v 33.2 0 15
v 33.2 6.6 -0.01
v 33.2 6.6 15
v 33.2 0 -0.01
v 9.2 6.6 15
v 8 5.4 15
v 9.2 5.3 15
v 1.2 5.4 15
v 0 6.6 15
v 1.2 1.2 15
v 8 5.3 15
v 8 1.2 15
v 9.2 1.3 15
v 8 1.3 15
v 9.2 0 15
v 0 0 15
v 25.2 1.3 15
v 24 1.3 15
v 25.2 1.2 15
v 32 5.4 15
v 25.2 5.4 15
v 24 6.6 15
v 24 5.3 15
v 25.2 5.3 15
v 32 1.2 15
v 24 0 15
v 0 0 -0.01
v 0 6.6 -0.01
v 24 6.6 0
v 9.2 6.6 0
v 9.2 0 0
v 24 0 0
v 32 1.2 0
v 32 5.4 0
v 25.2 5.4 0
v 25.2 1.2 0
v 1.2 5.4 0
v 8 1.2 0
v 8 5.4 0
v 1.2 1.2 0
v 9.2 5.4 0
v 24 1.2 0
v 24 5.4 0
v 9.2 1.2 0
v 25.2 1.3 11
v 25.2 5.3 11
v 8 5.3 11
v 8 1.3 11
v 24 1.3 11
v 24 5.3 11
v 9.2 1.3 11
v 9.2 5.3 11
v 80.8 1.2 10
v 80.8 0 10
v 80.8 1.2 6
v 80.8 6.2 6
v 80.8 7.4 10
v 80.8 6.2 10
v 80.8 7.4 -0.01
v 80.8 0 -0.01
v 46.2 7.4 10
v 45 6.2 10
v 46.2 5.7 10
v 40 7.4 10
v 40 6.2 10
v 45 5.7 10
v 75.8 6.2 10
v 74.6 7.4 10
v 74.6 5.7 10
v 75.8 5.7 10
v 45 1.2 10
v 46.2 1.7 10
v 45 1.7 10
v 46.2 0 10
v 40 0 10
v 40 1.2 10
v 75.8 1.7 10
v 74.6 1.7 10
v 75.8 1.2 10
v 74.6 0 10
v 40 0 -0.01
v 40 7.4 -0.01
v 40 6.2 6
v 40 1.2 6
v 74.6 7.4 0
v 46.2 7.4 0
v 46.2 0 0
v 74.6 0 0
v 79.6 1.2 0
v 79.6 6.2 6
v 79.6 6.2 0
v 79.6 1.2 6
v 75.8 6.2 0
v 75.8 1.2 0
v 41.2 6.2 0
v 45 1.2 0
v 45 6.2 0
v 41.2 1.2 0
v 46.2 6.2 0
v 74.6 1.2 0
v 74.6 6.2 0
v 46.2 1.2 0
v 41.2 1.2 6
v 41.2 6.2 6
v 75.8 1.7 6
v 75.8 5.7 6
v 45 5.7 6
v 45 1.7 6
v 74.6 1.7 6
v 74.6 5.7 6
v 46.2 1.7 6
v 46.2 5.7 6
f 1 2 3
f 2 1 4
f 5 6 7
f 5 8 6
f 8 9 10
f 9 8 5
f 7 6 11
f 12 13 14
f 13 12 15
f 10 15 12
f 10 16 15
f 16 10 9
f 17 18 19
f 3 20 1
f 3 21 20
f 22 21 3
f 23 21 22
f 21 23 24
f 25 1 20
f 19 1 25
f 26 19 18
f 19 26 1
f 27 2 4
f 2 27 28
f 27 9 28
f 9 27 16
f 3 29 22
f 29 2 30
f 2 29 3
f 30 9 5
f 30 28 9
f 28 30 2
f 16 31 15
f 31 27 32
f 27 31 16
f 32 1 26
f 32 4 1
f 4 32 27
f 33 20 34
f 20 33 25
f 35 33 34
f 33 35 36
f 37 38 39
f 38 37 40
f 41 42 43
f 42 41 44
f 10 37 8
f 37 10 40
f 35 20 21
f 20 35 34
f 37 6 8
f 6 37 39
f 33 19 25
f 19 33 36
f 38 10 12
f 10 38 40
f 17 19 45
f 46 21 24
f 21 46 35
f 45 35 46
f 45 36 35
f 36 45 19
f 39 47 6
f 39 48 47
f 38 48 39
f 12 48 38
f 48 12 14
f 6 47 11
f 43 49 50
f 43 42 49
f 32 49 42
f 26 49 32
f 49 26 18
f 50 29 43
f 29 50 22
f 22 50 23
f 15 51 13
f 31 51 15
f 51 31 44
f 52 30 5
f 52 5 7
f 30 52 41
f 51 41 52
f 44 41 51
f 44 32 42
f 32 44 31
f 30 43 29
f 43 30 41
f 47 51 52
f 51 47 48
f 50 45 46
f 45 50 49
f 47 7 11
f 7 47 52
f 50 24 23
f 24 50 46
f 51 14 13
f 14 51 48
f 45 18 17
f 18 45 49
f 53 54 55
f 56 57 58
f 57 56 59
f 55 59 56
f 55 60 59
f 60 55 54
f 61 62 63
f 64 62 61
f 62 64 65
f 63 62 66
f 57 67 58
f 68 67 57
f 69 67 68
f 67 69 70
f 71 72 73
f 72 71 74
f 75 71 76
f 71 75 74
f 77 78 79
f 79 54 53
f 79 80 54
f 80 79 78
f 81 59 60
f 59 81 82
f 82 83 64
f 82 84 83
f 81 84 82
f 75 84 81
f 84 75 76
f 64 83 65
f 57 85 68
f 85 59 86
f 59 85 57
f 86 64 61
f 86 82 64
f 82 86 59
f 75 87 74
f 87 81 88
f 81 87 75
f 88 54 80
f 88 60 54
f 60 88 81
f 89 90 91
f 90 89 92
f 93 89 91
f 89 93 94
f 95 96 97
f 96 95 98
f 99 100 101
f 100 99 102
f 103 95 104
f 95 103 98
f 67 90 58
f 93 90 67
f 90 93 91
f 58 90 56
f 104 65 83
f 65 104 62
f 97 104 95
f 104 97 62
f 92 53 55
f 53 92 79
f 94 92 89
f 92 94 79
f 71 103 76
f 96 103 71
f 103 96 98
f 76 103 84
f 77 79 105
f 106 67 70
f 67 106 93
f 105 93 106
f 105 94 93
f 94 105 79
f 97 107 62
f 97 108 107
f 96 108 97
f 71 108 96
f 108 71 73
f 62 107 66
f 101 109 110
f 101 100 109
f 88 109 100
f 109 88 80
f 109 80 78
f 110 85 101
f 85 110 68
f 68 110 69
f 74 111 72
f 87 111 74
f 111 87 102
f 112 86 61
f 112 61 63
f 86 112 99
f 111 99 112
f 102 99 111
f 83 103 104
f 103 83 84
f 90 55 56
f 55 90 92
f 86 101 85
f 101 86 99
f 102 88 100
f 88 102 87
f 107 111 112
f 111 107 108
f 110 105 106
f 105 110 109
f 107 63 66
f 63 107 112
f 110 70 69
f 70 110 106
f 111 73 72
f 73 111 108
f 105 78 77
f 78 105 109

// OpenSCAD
// file: ../../Base/Boxes.scad
// Fischertechnik Box Foundation
// Pre-designed Boxes

use <Constants.scad>

include <PlacementOptions.scad>

box190Width = 190;
box190Depth = 130;
box130Width = 130;
box130Depth = 95;
boxUsageHeight = 33.9;
boxWallThickness = 2.4;
boxBaseThickness = 1.0;

// getBoxWallThickness()
// Gets the wall thickness of a Fischertechnik Box

function getBoxWallThickness() = boxWallThickness;

// Gets the usable height of a fischertechnik box
function getBoxUsageHeight() = boxUsageHeight;

// Gets the thickness of the Fischertechnik box base.
function getBoxBaseThickness() = boxBaseThickness;

// Gets the usable inner space of a Box 190 as an x/y-list
function getBox190Space() = [
    box190Width - 2*getBoxWallThickness(), 
    box190Depth - 2*getBoxWallThickness() ];

// Imports the Fischertechnik empty box 130x190 mm and places it at position 0,0
// 190x130 are the outer sizes, the inner space is slightly smaller. Use getBox190Space() to get the inner sizes.
// This module needs the STL file "Fischertechnik Box 130x190.stl" in the library path.
// The box is positioned that the usable inner space is at the 0,0,0 position. The

module Box190() {
    translate([-getBoxWallThickness(),-getBoxWallThickness(),-getBoxBaseThickness()])
        import("Fischertechnik Box 130x190.stl", convexity=3);
}

// Gets the usable inner space of a Box 130 as an x/y-list
function getBox130Space() = [
    box130Width - 2*getBoxWallThickness(), 
    box130Depth - 2*getBoxWallThickness() ];

// Imports the Fischertechnik empty box 95x130 mm and places it at position 0,0
// 190x130 are the outer sizes, the inner space is slightly smaller. Use getBox190Space() to get the inner sizes.
// This module needs the STL file "Fischertechnik Box 95x130.stl" in the library path.
// The box is positioned that the usable inner space is at the 0,0,0 position. The

module Box130() {
    translate([-getBoxWallThickness(),-getBoxWallThickness(),-getBoxBaseThickness()])
        import("Fischertechnik Box 95x130.stl", convexity=3);
}

// Creates a web at the specified box walls
// corner 0 = LowerLeft, 1 = UpperLeft, 2 = UpperRight, 3 = LowerRight
// side 0 = LeftOfCorner, 1 = RightOfCorner
// distance = Distance in mm from the corner
// box = inner width and depth of the box (default: Box 190)
// webWidth = length of the web (default is 3 mms)
// webThickness = thickness of the web (default is 1 mm)

module BoxWeb(corner, side, distance, box=getBox190Space(), webWidth=3, webThickness=1.0) {
    sink = getBoxWallThickness()/2;

    width = (corner % 2 == 0) ? 
            (side == LeftOfCorner ? webWidth : webThickness) :
            (side == LeftOfCorner ? webThickness : webWidth);

    depth = (corner % 2 == 0) ? 
            (side == RightOfCorner ? webWidth : webThickness) :
            (side == RightOfCorner ? webThickness : webWidth);
    
    xDiff = corner == LowerLeft ? 
                (side == LeftOfCorner ? -sink : distance) :
            (corner == UpperLeft ?                
                (side == LeftOfCorner ? distance : -sink) :
            (corner == UpperRight ?
                (side == LeftOfCorner ? box.x-webWidth+sink : box.x-distance-webThickness) :
                (side == LeftOfCorner ? box.x-distance-webThickness: box.x-webWidth+sink)));

    yDiff = corner == LowerLeft ? 
                (side == RightOfCorner ? -sink : distance) :
            (corner == UpperLeft ?
                (side == RightOfCorner ? box.y-distance : box.y-webWidth+sink) :
            (corner == UpperRight ?
                (side == RightOfCorner ? box.y-webWidth+sink : box.y-distance) :
                (side == RightOfCorner ? distance : -sink)));
    
    translate([xDiff, yDiff, -getExcess()])
        cube([width, depth, boxUsageHeight + 2*getExcess()]);
}
// file: ../../Base/Rotation.scad
// Fischertechnik Box Foundation
// Geometry Helpers Rotation

include <PlacementOptions.scad>

// getRotatedSpace(space, rotation=NoRotation)
// Rotates the space dependent on the specified rotation

function getRotatedSpace(space, rotation=NoRotation) = [
    (rotation == Rotate90 || rotation == Rotate270) ? space.y : space.x,
    (rotation == Rotate90 || rotation == Rotate270) ? space.x : space.y
];

// Rotates the given space around the fixed left lower corner
// space = the space the children needs as width/depth list [width,depth]
// rotation = 0 Rotate0 degrees, 1 Rotate90 degrees, 2 Rotate180 degrees, 3 Rotate270 degrees (equivalent to -90)

module RotateFix(space, rotation=Rotate0) {
    dy = (rotation == Rotate0 || rotation == Rotate270) ? 0 :
        (rotation == Rotate90) ? space.x :
        space.y;
    dx = (rotation < Rotate180) ? 0 :
        (rotation == Rotate180) ? space.x :
        space.y;
    
    translate([dx, dy, 0])
        rotate([0, 0, rotations[rotation]])
            children();
}
// file: ../../Base/Alignment.scad
// Fischertechnik Box Foundation
// Geometry Helpers Alignment

include <PlacementOptions.scad>

// getAlignedX(elementWidth, spaceWidth, align=AlignRight, offset=0)
// Gets the aligned X offset of an element with the given
// width in the given space.
// elementWidth = The width of the element to positon
// spaceWidth = The space where the element should be aligned
// align = 0 AlignLeft, 1 AlignCenter, 2 AlignRight
// offset = an optional offset from the aligned position. When
// aligned left or centered, then positive values are in X direction.
// When aligned right then positive values are in negative X direction.

function getAlignedX(elementWidth, spaceWidth, align=AlignRight, offset=0) =
    (align == AlignLeft) ?
        offset :
        ((align == AlignCenter) ?
        (spaceWidth - elementWidth)/2 + offset :
        spaceWidth - offset - elementWidth);

// getAlignedY(elementDepth, spaceDepth, align=AlignTop, offset=0)
// Gets the aligned Y offset of an element with the given
// depth in the given space.
// elementDepth = The depth of the element to positon
// spaceDepth = The space where the element should be aligned
// align = 0 AlignBottom, 1 AlignCenter, 2 AlignTop
// offset = an optional offset from the aligned position. When
// aligned bottom or centered, then positive values are in Y direction.
// When aligned top then positive values are in negative Y direction.

function getAlignedY(elementDepth, spaceDepth, align=AlignTop, offset=0) =
    (align == AlignBottom) ?
        offset :
        ((align == AlignCenter) ?
        (spaceDepth - elementDepth)/2 + offset :
        spaceDepth - offset - elementDepth);
// file: ../../Base/PlacementOptions.scad
// Fischertechnik Box Foundation
// Placement Options

// Alignment
NoAlign = 0;
AlignLeft = 1;
AlignBottom = 2;
AlignCenter = 3;
AlignRight = 4;
AlignTop = 5;

// Element rotation degree steps
rotations = [0, -90, -180, -270];

// Rotation
NoRotation = 0;
Rotate0 = 0;
Rotate90 = 1;
Rotate180 = 2;
Rotate270 = 3;

// Docking (seen from above)
NoDock = -1;
DockLeft = 0;
DockTop = 1;
DockRight = 2;
DockCorner = 2;
DockBottom = 3;

// Web corners
LowerLeft = 0;
UpperLeft = 1;
UpperRight = 2;
LowerRight = 3;

// Web position relative to corner
LeftOfCorner = 0;
RightOfCorner = 1;
// file: ../../Base/Placement.scad
// Fischertechnik Box Foundation
// Geometry Helpers Placement

use <Constants.scad>
use <Alignment.scad>
use <Rotation.scad>
use <Boxes.scad>

include <PlacementOptions.scad>

// Place(x=0, y=0, elementSpace=[0,0], alignX=AlignLeft, alignY=AlignBottom, rotation=Rotate0, boxSpace=getBox190Space())
// Places the child at the specified position
// y = Y-Position. This is a relative position when an X aligment is specified.
// x = X-Position. This is a relative position when an Y aligment is specified.
// elementSpace = space of the element to be placed [x,y]
// alignX = -1=NoAlign, 0 AlignLeft, 1 AlignCenter, 3 AlignRight (elementSpace and boxSpace required!)
// alignY = -1=NoAlign, 2 AlignBottom, 1 AlignCenter, 4 AlignTop (elementSpace and boxSpace required!)
// rotation = 0 Rotate0 0 degrees, 1 Rotate90 90 degrees, 
// 2 Rotate180 180 degrees, 3 Rotate270 270 degrees (equivalent to -90)
// boxSpace = Inner space of the box where the placement occurs [x,y] - default is Box 190x130 inner space

module Place(x=0, y=0, elementSpace=[0,0], 
  alignX=AlignLeft, alignY=AlignBottom, 
  rotation=NoRotation, boxSpace=getBox190Space()) {

    module Position(x, y, space, rotation=Rotate0) {
        translate([x, y, 0])
            RotateFix(space, rotation)
                children(0);
    }

    space = getRotatedSpace(elementSpace, rotation);
    alignedX = getAlignedX(space.x, boxSpace.x, alignX, x);
    alignedY = getAlignedY(space.y, boxSpace.y, alignY, y);
    Position(alignedX, alignedY, elementSpace, rotation)
        children(0);
}

// Center(space=getBox130Space(), elementSpace=[0,0])
// space = Space where the children is centered. For cylinder use centered=true and no elementSpace.
// elementSpace = space of the element to be centered [x,y]

module Center(space=getBox190Space(), elementSpace=[0,0]) {
    translate([(space.x - elementSpace.x) / 2, (space.y - elementSpace.y) / 2])
        children(0);
}

// CenterHorizontal(width=0, y=0, offset=0, space=getBox130Space())
// space = Space where the children is centered. For cylinder use centered=true and no elementSpace.
// elementSpace = space of the element to be centered [x,y]

module CenterHorizontal(width=0, y=0, offset=0, space=getBox190Space()) {
    translate([(space.x - width) / 2 + offset, y])
        children(0);
}

// CenterVertical(depth=0, x=0, offset=0, space=getBox130Space())
// space = Space where the children is centered. For cylinder use centered=true and no elementSpace.
// elementSpace = space of the element to be centered [x,y]

module CenterVerticalal(depth=0, x=0, offset=0, space=getBox190Space()) {
    translate([x, (space.y - depth) / 2 + offset])
        children(0);
}
// file: ../../Base/Constants.scad
// Fischertechnik Box Foundation
// Constants

// Constant values necessary for multiple elements

// Base constants
dividerThickness = 1.2;
excess = 0.01;
fragments = 90;
tolerance = 0.8;

// Gets the thickness of a divider 
function getDividerThickness() = dividerThickness;

// Gets the excess that is used to merge walls into each other
function getExcess() = excess;

// Gets amount of fragments of a cylinder
function getFragments() = fragments;

// Gets the inner tolerance of a frame to each side
function getTolerance() = tolerance;


// Fischertechnik specific constants
axisDiameter = 4;
axisBottomDiameter = axisDiameter + 1;
standardEdgeDistance = 2.5;
standardWebDistance = 11.5;
standardCornerLength = 15;
tubeWallFactor = 1.6;

// Gets axis diameter
function getAxisDiameter() = axisDiameter;

// Gets axis bottom diameter for thicker part at the bottom
function getAxisBottomDiameter() = axisBottomDiameter;

// gets the standard distance to the wall of the box for dockable frames with webs
function getStandardEdgeDistance() = standardEdgeDistance;

// gets the standard distance of each web to the corner of the dockable frame
function getStandardWebDistance() = standardWebDistance;

// gets the standard length of the corner walls of a dockable frame
function getStandardCornerLength() = standardCornerLength;

// gets the wall thickness of a tube.
function getTubeWallThickness() = tubeWallFactor * getDividerThickness();
// main file
// Fischertechnik Box Foundation
// ModelBase
// Test ElevatedFramesWithCutoff

use <../../Base/Constants.scad>
use <../../ModelBase/Complex.scad>

ElevatedFramesWithCutoff([30, 4, 4], 4.2, 15, 8);

translate([40, 0])
    ElevatedFramesWithCutoff([40, 4, 4], 5, 10, 5, true);
